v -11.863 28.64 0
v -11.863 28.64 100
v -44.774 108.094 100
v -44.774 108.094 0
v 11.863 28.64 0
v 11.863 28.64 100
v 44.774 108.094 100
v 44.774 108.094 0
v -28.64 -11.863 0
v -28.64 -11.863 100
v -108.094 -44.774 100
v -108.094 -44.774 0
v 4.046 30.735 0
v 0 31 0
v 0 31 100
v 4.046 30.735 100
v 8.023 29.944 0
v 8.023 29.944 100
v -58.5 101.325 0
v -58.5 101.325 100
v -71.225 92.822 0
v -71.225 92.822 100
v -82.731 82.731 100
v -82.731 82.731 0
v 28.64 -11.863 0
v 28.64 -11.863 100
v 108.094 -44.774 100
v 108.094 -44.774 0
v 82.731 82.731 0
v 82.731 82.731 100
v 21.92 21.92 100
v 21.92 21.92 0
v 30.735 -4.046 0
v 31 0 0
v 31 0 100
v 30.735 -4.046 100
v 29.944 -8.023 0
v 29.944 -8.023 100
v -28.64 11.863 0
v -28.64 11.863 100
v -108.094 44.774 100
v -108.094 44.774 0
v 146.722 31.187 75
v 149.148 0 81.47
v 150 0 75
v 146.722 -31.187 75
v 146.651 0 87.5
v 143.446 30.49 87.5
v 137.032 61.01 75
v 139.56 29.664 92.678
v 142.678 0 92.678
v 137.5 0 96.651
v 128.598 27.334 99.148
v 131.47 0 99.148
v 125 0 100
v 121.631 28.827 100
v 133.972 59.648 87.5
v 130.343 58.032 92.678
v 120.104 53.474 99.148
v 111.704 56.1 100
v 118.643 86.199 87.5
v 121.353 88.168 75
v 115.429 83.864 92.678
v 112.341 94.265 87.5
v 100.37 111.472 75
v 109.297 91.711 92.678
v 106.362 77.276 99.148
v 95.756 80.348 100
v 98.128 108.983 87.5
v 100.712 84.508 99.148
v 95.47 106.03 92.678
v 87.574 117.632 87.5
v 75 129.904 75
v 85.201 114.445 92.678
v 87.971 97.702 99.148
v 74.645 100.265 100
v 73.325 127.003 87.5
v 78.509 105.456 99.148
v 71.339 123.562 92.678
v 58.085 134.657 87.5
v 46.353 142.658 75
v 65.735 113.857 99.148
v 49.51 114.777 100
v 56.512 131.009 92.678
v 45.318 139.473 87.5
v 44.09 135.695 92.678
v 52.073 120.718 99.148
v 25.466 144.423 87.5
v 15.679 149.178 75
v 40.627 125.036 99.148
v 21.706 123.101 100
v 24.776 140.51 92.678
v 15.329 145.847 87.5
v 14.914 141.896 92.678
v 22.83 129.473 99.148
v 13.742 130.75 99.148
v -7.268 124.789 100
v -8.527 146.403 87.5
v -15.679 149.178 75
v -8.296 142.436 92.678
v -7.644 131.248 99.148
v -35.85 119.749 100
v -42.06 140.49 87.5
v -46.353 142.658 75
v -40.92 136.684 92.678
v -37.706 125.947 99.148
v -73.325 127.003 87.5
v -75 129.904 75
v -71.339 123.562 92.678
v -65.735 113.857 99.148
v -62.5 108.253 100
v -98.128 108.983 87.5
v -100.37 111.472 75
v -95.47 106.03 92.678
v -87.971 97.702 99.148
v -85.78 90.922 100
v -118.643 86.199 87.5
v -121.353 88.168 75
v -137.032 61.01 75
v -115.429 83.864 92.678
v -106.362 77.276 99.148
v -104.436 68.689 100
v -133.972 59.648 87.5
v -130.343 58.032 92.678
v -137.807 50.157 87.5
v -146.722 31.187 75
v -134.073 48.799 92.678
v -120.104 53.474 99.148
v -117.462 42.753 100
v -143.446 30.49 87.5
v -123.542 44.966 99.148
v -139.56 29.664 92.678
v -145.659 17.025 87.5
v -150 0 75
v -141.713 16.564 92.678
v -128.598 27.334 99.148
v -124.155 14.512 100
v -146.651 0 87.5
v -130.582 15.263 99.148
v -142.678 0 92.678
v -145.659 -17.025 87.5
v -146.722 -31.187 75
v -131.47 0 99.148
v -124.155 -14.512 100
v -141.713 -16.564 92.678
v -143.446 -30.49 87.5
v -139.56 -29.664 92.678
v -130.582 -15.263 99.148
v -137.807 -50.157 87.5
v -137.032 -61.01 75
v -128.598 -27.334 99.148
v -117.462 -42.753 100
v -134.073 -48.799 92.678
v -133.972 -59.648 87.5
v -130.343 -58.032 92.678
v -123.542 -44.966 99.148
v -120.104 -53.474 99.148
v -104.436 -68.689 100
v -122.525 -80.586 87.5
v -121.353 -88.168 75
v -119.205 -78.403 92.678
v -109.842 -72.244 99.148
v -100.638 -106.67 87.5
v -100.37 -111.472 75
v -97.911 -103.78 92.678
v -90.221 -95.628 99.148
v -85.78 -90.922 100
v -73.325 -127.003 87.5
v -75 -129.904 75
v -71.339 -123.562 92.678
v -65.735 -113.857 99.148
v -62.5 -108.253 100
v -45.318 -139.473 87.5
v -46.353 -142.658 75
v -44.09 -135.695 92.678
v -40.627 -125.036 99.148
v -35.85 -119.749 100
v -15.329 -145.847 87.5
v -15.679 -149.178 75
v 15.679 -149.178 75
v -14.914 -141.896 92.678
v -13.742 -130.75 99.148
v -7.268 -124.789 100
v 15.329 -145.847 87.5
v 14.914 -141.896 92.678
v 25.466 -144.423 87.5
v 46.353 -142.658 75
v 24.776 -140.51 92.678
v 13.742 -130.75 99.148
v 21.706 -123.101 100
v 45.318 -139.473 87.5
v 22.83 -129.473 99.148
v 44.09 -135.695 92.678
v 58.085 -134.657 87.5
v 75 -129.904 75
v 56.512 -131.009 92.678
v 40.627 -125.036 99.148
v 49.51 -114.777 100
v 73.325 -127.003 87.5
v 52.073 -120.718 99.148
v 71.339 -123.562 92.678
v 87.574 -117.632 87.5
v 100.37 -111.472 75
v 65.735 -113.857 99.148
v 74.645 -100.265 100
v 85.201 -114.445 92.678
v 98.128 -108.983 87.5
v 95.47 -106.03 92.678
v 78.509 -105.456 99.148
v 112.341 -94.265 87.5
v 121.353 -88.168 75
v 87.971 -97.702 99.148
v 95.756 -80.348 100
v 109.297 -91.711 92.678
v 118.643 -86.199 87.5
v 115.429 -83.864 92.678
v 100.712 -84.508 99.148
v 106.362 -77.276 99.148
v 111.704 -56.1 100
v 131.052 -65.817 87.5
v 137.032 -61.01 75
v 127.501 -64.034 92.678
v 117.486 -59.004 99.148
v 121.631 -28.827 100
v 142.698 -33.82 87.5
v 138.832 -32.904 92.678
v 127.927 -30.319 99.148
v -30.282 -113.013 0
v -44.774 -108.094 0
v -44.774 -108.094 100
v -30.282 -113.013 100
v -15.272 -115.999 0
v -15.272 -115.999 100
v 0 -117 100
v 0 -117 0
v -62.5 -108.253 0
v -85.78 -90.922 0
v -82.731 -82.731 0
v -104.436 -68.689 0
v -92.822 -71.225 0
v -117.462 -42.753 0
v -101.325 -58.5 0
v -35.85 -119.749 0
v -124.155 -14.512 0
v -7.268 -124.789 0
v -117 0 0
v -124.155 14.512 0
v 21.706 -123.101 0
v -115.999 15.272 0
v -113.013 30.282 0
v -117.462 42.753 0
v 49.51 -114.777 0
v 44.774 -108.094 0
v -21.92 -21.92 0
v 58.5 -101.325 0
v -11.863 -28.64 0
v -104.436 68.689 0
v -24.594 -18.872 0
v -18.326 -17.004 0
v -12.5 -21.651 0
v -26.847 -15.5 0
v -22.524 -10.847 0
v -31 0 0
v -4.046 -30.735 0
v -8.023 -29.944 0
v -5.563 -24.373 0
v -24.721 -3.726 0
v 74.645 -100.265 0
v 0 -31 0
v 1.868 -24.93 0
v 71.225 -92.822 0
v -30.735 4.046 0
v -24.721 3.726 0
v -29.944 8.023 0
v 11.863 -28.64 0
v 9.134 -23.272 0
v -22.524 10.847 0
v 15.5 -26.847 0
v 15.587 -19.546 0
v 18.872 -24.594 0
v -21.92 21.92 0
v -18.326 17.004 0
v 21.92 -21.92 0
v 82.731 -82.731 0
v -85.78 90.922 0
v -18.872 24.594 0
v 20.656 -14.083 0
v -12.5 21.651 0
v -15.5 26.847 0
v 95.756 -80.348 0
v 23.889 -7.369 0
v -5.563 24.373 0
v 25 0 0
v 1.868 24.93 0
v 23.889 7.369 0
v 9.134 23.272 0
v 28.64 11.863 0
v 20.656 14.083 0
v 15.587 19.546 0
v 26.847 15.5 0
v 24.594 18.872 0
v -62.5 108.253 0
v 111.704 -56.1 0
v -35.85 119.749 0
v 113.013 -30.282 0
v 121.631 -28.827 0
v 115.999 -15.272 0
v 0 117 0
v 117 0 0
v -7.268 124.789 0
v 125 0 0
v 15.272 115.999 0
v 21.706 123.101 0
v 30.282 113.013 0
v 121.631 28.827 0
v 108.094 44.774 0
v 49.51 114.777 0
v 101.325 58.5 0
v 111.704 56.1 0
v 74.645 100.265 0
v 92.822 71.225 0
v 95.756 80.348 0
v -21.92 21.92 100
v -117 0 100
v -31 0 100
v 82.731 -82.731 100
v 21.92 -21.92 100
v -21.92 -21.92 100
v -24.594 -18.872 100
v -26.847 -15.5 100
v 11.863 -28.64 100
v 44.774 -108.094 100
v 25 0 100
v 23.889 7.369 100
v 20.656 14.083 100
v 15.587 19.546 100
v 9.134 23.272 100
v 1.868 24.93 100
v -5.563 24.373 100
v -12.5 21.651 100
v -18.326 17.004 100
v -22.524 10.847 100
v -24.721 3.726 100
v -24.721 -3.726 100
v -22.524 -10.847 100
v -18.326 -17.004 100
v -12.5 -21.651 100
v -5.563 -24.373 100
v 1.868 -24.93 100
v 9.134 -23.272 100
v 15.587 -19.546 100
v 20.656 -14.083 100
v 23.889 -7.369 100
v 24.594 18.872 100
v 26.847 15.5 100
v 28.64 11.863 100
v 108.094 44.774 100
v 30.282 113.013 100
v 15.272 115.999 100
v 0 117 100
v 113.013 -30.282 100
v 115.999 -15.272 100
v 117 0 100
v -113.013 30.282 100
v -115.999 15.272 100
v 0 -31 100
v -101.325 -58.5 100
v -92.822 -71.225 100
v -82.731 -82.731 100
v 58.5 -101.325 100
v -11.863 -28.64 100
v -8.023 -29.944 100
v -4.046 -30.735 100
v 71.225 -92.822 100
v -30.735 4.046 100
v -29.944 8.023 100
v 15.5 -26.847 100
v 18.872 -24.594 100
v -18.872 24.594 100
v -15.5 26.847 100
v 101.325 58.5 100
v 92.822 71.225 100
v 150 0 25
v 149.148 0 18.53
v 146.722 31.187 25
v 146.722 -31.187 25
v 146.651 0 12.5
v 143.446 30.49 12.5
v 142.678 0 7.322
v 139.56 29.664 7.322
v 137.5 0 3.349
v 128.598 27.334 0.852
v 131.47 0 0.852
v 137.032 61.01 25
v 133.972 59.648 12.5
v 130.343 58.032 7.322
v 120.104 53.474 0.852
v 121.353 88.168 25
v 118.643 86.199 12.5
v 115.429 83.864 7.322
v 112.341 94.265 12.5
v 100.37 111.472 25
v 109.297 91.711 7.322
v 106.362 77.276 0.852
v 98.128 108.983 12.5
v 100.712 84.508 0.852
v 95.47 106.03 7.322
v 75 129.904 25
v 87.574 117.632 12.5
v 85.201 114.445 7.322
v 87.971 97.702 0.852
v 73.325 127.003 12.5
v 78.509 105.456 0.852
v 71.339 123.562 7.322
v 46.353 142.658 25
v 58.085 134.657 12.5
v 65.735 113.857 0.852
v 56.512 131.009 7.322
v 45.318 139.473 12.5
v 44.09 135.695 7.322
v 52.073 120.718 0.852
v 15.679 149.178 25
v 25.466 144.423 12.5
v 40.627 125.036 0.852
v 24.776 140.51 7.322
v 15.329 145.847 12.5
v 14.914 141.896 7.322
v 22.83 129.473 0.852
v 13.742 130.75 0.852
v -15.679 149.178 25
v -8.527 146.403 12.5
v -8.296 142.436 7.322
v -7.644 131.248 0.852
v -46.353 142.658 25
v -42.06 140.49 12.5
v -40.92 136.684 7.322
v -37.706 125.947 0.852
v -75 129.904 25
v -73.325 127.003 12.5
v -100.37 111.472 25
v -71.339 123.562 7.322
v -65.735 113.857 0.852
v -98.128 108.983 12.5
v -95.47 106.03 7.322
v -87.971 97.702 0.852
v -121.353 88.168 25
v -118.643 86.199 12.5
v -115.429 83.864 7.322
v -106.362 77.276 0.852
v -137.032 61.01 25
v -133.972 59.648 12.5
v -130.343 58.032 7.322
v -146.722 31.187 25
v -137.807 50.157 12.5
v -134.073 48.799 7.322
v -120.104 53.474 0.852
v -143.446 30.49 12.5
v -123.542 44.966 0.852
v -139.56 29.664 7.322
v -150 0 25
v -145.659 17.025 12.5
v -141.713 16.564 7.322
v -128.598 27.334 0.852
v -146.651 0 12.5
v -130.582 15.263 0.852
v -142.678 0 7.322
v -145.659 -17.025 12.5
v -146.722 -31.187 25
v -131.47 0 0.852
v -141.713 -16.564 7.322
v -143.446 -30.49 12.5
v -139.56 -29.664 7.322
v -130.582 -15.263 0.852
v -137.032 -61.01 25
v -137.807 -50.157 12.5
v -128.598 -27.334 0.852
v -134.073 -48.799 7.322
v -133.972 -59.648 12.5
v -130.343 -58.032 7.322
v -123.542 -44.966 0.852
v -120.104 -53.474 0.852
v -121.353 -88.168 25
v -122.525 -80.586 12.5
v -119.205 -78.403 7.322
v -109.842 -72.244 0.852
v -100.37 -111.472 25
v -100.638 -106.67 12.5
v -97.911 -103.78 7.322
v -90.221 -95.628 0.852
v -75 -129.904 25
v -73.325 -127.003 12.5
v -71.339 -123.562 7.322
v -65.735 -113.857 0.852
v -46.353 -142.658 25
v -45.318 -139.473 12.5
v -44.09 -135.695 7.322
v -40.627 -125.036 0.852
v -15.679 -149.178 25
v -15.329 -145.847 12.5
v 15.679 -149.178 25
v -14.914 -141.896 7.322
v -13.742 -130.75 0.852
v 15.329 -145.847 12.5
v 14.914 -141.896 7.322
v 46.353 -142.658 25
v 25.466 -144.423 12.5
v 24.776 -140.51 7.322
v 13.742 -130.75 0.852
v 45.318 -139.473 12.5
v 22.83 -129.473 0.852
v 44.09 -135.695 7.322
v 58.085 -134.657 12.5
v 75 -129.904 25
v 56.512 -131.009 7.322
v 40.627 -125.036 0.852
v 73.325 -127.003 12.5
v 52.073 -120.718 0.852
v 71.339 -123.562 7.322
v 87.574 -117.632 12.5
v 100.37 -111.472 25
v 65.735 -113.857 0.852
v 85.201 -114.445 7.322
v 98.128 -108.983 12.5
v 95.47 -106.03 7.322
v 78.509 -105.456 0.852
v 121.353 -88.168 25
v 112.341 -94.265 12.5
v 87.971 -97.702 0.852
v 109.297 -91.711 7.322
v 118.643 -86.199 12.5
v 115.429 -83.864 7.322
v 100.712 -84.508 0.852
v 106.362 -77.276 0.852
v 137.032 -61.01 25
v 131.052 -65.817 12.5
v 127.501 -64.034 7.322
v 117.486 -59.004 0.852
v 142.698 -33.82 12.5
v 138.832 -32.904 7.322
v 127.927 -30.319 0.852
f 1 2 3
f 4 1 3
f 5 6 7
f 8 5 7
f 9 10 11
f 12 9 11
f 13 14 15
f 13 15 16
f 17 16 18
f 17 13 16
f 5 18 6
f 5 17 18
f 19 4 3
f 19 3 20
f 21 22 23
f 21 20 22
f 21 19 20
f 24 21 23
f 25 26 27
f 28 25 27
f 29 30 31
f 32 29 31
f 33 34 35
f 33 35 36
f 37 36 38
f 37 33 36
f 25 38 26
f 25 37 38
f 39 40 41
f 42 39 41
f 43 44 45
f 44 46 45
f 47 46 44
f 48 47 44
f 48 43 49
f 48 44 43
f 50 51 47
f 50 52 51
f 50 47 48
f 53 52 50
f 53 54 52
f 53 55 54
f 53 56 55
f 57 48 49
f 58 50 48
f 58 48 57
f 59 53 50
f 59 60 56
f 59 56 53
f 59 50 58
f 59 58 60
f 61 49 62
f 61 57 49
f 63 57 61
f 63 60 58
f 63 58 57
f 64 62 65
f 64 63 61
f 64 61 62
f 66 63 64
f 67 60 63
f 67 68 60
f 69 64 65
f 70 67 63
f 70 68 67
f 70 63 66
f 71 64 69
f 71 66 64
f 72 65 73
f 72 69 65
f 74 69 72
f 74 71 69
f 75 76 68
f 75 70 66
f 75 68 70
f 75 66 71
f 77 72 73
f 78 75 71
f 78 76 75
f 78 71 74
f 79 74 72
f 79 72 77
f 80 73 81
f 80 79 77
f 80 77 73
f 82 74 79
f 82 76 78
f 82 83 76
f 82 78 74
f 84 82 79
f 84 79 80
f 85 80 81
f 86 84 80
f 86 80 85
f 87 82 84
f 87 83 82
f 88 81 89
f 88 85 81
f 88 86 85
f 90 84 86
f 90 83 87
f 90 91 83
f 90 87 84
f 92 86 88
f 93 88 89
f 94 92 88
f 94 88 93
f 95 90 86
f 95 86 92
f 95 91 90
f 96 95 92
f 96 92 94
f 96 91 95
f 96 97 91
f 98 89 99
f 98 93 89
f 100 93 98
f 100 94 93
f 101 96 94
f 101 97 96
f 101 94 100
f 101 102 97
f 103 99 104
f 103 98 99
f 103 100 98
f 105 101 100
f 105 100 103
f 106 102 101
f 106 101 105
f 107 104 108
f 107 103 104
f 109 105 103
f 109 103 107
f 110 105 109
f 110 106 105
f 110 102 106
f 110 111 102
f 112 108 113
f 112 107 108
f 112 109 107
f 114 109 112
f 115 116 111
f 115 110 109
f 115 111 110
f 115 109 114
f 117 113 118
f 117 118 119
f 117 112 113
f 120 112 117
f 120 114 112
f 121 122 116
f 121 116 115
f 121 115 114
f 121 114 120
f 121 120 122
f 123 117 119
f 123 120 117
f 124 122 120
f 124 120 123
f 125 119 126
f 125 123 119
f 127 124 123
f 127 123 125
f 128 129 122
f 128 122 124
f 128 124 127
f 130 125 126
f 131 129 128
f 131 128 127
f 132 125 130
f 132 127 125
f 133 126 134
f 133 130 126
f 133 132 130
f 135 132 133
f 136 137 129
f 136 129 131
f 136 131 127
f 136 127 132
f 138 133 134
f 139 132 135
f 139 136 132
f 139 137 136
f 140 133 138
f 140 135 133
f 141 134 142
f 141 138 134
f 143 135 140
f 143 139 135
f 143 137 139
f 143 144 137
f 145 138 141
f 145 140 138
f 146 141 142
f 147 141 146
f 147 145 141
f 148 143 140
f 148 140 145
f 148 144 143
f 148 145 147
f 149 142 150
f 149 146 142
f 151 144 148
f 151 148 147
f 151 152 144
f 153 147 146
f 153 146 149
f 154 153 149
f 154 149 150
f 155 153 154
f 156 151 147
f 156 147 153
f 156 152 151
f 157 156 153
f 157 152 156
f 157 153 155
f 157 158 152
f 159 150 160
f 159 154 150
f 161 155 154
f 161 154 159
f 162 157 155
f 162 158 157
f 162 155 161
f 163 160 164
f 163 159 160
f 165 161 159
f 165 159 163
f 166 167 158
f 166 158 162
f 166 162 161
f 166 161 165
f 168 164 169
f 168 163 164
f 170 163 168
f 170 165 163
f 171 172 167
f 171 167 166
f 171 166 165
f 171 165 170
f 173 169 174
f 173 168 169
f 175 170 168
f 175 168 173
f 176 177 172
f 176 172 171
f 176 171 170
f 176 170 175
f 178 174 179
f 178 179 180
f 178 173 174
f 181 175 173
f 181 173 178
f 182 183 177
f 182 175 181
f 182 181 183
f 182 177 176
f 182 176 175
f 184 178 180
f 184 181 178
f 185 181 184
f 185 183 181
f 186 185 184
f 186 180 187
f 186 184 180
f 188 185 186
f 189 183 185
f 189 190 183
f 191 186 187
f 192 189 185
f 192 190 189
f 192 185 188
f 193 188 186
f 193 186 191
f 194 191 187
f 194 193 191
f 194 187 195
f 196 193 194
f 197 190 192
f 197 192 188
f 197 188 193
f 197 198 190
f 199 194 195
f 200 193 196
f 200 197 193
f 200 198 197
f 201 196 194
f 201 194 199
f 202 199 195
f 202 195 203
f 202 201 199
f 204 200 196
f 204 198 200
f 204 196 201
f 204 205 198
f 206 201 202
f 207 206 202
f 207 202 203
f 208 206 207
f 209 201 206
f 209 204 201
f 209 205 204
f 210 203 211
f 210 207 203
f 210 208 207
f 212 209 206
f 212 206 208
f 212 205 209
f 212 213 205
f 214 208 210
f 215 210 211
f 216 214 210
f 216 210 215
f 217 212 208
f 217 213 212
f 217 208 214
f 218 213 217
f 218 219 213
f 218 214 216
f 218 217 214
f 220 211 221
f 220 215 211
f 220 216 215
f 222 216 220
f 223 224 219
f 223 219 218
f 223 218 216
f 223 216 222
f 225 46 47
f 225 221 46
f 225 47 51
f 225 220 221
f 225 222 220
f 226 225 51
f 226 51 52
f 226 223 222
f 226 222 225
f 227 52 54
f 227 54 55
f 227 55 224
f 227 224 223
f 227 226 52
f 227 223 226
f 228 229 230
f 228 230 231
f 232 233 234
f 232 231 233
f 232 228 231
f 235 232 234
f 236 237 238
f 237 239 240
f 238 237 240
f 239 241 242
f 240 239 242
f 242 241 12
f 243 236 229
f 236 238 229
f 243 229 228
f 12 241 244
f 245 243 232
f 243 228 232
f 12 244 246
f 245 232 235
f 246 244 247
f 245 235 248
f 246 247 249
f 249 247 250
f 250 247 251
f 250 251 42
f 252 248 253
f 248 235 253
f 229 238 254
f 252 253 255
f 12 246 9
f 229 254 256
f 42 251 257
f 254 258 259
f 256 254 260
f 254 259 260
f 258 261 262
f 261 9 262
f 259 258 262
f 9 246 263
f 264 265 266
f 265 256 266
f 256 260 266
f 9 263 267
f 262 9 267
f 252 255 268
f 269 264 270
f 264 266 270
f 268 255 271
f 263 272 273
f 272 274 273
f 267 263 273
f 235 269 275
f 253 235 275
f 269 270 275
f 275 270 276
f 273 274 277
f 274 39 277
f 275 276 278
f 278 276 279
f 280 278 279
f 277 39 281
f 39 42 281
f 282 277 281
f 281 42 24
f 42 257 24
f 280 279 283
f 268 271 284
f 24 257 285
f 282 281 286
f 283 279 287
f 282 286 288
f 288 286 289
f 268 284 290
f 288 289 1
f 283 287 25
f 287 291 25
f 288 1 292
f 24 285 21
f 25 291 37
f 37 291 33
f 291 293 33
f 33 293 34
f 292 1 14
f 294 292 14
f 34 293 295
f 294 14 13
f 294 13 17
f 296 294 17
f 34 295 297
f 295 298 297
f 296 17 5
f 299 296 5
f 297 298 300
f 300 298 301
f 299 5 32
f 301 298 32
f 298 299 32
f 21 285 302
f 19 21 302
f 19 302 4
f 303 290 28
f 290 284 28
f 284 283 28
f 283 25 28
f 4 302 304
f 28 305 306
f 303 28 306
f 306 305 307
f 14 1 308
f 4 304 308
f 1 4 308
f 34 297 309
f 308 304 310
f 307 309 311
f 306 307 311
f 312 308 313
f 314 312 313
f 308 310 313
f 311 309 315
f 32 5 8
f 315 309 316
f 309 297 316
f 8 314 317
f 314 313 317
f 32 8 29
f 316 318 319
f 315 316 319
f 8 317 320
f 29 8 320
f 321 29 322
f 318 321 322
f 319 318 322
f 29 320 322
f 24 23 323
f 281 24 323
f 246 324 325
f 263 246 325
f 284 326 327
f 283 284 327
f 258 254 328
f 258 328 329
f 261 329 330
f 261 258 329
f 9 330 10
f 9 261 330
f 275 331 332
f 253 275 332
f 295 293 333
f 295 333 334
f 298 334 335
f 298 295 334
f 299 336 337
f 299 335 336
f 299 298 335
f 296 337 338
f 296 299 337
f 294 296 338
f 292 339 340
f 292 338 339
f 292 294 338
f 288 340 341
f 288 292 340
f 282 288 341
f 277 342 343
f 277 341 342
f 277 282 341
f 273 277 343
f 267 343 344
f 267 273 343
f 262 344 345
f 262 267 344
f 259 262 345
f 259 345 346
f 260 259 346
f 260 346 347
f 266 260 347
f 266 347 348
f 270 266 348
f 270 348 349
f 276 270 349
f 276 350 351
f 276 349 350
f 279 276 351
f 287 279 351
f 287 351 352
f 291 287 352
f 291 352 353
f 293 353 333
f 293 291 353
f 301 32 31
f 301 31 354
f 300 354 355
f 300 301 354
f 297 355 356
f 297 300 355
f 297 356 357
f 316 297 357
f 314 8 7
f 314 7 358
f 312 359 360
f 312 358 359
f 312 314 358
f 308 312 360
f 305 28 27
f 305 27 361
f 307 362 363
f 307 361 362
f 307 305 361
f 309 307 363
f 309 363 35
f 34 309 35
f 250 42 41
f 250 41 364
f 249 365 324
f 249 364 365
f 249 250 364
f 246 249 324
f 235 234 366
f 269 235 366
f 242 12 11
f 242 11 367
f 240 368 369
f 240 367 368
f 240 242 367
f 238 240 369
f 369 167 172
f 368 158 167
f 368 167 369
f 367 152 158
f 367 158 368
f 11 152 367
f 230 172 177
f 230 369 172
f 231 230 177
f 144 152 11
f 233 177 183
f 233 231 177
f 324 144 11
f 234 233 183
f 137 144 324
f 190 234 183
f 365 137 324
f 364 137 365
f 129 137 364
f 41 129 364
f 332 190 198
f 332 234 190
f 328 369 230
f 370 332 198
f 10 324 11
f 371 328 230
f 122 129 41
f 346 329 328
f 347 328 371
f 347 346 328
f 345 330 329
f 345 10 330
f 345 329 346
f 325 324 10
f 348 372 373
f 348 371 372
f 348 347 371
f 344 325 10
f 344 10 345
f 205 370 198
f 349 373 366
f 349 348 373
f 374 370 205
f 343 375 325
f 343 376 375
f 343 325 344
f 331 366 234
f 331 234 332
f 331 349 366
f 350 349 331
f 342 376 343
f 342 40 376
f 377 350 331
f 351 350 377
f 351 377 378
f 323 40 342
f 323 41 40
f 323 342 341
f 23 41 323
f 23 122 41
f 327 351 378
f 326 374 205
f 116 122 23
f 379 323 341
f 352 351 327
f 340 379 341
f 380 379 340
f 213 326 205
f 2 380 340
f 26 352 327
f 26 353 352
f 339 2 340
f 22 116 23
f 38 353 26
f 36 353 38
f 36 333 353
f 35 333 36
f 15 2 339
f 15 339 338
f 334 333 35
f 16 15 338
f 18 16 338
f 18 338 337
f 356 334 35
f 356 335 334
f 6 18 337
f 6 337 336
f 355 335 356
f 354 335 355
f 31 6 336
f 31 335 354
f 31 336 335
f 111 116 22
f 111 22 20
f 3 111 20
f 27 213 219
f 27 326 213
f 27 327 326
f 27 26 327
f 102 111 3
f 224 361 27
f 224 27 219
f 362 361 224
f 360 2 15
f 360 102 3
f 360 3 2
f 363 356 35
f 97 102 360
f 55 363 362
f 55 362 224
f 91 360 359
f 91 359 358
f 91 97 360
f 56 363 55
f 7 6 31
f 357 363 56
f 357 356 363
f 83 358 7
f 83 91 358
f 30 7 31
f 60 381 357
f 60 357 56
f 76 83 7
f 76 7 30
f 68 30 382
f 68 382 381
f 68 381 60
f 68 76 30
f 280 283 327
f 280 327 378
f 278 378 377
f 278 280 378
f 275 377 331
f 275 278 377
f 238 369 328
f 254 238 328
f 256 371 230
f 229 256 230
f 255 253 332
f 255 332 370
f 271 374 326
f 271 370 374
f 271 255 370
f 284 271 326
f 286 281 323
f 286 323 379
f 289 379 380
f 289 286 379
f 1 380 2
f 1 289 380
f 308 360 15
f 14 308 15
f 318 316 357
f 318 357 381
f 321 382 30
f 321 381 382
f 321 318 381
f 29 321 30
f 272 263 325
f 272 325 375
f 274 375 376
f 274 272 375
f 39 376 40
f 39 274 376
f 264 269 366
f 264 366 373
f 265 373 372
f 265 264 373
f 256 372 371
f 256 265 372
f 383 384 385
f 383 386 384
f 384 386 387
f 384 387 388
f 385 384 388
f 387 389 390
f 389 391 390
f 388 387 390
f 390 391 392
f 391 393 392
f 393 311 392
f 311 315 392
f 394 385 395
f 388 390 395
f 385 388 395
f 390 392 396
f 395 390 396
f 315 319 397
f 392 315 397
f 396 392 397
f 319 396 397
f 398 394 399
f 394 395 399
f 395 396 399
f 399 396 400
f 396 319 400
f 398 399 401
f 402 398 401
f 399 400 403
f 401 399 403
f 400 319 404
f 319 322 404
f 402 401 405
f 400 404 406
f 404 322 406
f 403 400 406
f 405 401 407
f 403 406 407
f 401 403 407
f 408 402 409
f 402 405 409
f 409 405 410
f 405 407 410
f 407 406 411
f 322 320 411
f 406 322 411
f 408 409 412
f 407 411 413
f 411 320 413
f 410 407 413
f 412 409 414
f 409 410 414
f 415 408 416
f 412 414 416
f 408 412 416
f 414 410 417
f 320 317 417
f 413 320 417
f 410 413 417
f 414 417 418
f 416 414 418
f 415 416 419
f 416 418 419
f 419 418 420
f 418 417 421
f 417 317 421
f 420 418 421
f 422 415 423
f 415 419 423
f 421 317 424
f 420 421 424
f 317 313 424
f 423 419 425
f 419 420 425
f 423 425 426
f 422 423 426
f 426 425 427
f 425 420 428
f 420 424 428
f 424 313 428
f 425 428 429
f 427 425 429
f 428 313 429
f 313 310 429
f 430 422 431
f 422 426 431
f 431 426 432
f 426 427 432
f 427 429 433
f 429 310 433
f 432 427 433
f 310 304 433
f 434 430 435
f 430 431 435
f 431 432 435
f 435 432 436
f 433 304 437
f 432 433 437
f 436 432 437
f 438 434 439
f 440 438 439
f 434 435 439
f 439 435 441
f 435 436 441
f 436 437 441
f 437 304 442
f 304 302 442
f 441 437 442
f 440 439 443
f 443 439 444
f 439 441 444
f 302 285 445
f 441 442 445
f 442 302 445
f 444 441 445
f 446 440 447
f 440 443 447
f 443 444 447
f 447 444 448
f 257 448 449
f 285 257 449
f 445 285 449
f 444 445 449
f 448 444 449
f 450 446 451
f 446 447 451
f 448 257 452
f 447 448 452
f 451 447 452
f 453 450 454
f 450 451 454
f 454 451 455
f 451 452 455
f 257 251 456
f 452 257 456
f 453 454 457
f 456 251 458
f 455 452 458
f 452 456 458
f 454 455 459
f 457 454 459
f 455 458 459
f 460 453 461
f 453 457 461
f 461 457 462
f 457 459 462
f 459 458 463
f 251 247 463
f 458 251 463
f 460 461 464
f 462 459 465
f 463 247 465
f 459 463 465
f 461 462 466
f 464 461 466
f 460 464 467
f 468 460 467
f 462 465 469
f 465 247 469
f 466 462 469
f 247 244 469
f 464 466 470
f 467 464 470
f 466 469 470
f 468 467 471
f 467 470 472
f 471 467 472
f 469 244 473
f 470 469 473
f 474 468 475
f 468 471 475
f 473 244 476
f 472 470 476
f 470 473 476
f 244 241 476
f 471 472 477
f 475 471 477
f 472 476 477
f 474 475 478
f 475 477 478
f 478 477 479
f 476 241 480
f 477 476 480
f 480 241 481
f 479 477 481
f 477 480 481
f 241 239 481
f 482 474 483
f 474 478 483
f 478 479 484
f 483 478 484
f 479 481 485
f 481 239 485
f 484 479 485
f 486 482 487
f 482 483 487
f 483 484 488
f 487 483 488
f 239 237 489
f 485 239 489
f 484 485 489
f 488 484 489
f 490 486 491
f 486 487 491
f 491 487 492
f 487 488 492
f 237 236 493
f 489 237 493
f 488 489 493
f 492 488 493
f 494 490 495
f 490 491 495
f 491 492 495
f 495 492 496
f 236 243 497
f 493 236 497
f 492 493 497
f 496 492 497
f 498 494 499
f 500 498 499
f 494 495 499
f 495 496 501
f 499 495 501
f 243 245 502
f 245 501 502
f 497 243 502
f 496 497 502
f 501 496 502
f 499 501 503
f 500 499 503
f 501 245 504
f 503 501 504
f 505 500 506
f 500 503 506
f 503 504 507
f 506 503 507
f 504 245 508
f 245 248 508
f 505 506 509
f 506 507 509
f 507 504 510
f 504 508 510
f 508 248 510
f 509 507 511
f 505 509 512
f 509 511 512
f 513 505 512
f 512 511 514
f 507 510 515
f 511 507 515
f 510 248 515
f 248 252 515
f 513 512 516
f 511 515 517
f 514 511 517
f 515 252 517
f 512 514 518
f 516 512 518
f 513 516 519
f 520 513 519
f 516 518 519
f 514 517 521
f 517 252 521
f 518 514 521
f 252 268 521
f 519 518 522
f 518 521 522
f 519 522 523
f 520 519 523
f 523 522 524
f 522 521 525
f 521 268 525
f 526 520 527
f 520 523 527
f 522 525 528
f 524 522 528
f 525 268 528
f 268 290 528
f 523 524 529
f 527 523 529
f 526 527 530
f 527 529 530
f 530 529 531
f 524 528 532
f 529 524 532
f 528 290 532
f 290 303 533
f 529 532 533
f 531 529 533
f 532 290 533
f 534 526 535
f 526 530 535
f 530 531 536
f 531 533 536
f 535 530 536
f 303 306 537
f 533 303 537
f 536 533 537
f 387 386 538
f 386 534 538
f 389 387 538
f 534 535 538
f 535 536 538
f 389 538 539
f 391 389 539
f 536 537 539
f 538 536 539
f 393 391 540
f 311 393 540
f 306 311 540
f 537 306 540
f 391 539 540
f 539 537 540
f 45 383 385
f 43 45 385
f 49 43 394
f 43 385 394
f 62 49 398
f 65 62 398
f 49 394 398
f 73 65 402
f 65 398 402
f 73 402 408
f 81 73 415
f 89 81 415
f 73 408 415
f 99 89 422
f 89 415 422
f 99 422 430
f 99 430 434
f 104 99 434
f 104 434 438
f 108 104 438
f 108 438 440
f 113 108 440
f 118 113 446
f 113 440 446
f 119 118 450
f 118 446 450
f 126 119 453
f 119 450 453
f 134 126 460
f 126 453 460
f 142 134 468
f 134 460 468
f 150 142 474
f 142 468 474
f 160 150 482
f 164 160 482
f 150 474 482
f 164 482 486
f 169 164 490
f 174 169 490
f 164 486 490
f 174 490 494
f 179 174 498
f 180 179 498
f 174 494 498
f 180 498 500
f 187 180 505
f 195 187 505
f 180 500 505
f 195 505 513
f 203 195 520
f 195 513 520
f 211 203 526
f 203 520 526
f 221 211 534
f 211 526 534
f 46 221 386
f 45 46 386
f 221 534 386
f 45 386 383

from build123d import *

# Parameters (mm, degrees)
SKETCH1_R               = 150
BOSS_EXTRUDE1_DEPTH     = 100
FILLET1_R               = 25
CUT_EXTRUDE1_DEPTH      = 300
CUT_EXTRUDE1_DEPTH_BACK = 300
CUT_EXTRUDE2_DEPTH      = 300
CUT_EXTRUDE2_DEPTH_BACK = 300
SKETCH5_R               = 25


with BuildPart() as part:
    # Sketch1 → Boss-Extrude1 (new body)
    with BuildSketch(Plane.XY):
        Circle(SKETCH1_R)
    extrude(amount=BOSS_EXTRUDE1_DEPTH)

    # Fillet1
    fillet1_edges = [part.edges().sort_by_distance(p)[0] for p in [
        (-150, 0, 0),
        (-150, 0, 100),
    ]]
    fillet(fillet1_edges, radius=FILLET1_R)

    # Sketch4 → Cut-Extrude1 (cut, two sides: drawn at the far end of the back side and taken through both)
    with BuildSketch(Plane.XY.offset(-CUT_EXTRUDE1_DEPTH_BACK)):
        with BuildLine():
            Line((82.731493399, 82.731493399), (21.920310217, 21.920310217))
            ThreePointArc((21.920310217, 21.920310217), (25.775557981, 17.222677224), (28.640265508, 11.863186403))
            Line((28.640265508, 11.863186403), (108.093905304, 44.773961587))
            ThreePointArc((108.093905304, 44.773961587), (97.281944639, 65.001717263), (82.731493399, 82.731493399))
        make_face()
        with BuildLine():
            Line((0, 117), (0, 31))
            ThreePointArc((0, 31), (6.047799982, 30.404343693), (11.863186403, 28.640265508))
            Line((11.863186403, 28.640265508), (44.773961587, 108.093905304))
            ThreePointArc((44.773961587, 108.093905304), (22.825567676, 114.751877807), (0, 117))
        make_face()
        with BuildLine():
            Line((-82.731493399, 82.731493399), (-21.920310217, 21.920310217))
            ThreePointArc((-21.920310217, 21.920310217), (-17.222677224, 25.775557981), (-11.863186403, 28.640265508))
            Line((-11.863186403, 28.640265508), (-44.773961587, 108.093905304))
            ThreePointArc((-44.773961587, 108.093905304), (-65.001717263, 97.281944639), (-82.731493399, 82.731493399))
        make_face()
        with BuildLine():
            Line((-117, 0), (-31, 0))
            ThreePointArc((-31, 0), (-30.404343693, 6.047799983), (-28.640265508, 11.863186403))
            Line((-28.640265508, 11.863186403), (-108.093905304, 44.773961587))
            ThreePointArc((-108.093905304, 44.773961587), (-114.751877807, 22.825567676), (-117, 0))
        make_face()
        with BuildLine():
            Line((-82.731493399, -82.731493399), (-21.920310217, -21.920310217))
            ThreePointArc((-21.920310217, -21.920310217), (-25.775557981, -17.222677224), (-28.640265508, -11.863186403))
            Line((-28.640265508, -11.863186403), (-108.093905304, -44.773961587))
            ThreePointArc((-108.093905304, -44.773961587), (-97.281944639, -65.001717263), (-82.731493399, -82.731493399))
        make_face()
        with BuildLine():
            Line((0, -117), (0, -31))
            ThreePointArc((0, -31), (-6.047799983, -30.404343693), (-11.863186403, -28.640265508))
            Line((-11.863186403, -28.640265508), (-44.773961587, -108.093905304))
            ThreePointArc((-44.773961587, -108.093905304), (-22.825567676, -114.751877807), (0, -117))
        make_face()
        with BuildLine():
            Line((82.731493399, -82.731493399), (21.920310217, -21.920310217))
            ThreePointArc((21.920310217, -21.920310217), (17.222677224, -25.775557981), (11.863186403, -28.640265508))
            Line((11.863186403, -28.640265508), (44.773961587, -108.093905304))
            ThreePointArc((44.773961587, -108.093905304), (65.001717263, -97.281944639), (82.731493399, -82.731493399))
        make_face()
        with BuildLine():
            Line((117, 0), (31, 0))
            ThreePointArc((31, 0), (30.404343693, -6.047799983), (28.640265508, -11.863186403))
            Line((28.640265508, -11.863186403), (108.093905304, -44.773961587))
            ThreePointArc((108.093905304, -44.773961587), (114.751877807, -22.825567676), (117, 0))
        make_face()
    extrude(amount=CUT_EXTRUDE1_DEPTH + CUT_EXTRUDE1_DEPTH_BACK, mode=Mode.SUBTRACT)

    # Sketch5 → Cut-Extrude2 (cut, two sides: drawn at the far end of the back side and taken through both)
    with BuildSketch(Plane.XY.offset(-CUT_EXTRUDE2_DEPTH_BACK)):
        Circle(SKETCH5_R)
    extrude(amount=CUT_EXTRUDE2_DEPTH + CUT_EXTRUDE2_DEPTH_BACK, mode=Mode.SUBTRACT)


solid = part.part
